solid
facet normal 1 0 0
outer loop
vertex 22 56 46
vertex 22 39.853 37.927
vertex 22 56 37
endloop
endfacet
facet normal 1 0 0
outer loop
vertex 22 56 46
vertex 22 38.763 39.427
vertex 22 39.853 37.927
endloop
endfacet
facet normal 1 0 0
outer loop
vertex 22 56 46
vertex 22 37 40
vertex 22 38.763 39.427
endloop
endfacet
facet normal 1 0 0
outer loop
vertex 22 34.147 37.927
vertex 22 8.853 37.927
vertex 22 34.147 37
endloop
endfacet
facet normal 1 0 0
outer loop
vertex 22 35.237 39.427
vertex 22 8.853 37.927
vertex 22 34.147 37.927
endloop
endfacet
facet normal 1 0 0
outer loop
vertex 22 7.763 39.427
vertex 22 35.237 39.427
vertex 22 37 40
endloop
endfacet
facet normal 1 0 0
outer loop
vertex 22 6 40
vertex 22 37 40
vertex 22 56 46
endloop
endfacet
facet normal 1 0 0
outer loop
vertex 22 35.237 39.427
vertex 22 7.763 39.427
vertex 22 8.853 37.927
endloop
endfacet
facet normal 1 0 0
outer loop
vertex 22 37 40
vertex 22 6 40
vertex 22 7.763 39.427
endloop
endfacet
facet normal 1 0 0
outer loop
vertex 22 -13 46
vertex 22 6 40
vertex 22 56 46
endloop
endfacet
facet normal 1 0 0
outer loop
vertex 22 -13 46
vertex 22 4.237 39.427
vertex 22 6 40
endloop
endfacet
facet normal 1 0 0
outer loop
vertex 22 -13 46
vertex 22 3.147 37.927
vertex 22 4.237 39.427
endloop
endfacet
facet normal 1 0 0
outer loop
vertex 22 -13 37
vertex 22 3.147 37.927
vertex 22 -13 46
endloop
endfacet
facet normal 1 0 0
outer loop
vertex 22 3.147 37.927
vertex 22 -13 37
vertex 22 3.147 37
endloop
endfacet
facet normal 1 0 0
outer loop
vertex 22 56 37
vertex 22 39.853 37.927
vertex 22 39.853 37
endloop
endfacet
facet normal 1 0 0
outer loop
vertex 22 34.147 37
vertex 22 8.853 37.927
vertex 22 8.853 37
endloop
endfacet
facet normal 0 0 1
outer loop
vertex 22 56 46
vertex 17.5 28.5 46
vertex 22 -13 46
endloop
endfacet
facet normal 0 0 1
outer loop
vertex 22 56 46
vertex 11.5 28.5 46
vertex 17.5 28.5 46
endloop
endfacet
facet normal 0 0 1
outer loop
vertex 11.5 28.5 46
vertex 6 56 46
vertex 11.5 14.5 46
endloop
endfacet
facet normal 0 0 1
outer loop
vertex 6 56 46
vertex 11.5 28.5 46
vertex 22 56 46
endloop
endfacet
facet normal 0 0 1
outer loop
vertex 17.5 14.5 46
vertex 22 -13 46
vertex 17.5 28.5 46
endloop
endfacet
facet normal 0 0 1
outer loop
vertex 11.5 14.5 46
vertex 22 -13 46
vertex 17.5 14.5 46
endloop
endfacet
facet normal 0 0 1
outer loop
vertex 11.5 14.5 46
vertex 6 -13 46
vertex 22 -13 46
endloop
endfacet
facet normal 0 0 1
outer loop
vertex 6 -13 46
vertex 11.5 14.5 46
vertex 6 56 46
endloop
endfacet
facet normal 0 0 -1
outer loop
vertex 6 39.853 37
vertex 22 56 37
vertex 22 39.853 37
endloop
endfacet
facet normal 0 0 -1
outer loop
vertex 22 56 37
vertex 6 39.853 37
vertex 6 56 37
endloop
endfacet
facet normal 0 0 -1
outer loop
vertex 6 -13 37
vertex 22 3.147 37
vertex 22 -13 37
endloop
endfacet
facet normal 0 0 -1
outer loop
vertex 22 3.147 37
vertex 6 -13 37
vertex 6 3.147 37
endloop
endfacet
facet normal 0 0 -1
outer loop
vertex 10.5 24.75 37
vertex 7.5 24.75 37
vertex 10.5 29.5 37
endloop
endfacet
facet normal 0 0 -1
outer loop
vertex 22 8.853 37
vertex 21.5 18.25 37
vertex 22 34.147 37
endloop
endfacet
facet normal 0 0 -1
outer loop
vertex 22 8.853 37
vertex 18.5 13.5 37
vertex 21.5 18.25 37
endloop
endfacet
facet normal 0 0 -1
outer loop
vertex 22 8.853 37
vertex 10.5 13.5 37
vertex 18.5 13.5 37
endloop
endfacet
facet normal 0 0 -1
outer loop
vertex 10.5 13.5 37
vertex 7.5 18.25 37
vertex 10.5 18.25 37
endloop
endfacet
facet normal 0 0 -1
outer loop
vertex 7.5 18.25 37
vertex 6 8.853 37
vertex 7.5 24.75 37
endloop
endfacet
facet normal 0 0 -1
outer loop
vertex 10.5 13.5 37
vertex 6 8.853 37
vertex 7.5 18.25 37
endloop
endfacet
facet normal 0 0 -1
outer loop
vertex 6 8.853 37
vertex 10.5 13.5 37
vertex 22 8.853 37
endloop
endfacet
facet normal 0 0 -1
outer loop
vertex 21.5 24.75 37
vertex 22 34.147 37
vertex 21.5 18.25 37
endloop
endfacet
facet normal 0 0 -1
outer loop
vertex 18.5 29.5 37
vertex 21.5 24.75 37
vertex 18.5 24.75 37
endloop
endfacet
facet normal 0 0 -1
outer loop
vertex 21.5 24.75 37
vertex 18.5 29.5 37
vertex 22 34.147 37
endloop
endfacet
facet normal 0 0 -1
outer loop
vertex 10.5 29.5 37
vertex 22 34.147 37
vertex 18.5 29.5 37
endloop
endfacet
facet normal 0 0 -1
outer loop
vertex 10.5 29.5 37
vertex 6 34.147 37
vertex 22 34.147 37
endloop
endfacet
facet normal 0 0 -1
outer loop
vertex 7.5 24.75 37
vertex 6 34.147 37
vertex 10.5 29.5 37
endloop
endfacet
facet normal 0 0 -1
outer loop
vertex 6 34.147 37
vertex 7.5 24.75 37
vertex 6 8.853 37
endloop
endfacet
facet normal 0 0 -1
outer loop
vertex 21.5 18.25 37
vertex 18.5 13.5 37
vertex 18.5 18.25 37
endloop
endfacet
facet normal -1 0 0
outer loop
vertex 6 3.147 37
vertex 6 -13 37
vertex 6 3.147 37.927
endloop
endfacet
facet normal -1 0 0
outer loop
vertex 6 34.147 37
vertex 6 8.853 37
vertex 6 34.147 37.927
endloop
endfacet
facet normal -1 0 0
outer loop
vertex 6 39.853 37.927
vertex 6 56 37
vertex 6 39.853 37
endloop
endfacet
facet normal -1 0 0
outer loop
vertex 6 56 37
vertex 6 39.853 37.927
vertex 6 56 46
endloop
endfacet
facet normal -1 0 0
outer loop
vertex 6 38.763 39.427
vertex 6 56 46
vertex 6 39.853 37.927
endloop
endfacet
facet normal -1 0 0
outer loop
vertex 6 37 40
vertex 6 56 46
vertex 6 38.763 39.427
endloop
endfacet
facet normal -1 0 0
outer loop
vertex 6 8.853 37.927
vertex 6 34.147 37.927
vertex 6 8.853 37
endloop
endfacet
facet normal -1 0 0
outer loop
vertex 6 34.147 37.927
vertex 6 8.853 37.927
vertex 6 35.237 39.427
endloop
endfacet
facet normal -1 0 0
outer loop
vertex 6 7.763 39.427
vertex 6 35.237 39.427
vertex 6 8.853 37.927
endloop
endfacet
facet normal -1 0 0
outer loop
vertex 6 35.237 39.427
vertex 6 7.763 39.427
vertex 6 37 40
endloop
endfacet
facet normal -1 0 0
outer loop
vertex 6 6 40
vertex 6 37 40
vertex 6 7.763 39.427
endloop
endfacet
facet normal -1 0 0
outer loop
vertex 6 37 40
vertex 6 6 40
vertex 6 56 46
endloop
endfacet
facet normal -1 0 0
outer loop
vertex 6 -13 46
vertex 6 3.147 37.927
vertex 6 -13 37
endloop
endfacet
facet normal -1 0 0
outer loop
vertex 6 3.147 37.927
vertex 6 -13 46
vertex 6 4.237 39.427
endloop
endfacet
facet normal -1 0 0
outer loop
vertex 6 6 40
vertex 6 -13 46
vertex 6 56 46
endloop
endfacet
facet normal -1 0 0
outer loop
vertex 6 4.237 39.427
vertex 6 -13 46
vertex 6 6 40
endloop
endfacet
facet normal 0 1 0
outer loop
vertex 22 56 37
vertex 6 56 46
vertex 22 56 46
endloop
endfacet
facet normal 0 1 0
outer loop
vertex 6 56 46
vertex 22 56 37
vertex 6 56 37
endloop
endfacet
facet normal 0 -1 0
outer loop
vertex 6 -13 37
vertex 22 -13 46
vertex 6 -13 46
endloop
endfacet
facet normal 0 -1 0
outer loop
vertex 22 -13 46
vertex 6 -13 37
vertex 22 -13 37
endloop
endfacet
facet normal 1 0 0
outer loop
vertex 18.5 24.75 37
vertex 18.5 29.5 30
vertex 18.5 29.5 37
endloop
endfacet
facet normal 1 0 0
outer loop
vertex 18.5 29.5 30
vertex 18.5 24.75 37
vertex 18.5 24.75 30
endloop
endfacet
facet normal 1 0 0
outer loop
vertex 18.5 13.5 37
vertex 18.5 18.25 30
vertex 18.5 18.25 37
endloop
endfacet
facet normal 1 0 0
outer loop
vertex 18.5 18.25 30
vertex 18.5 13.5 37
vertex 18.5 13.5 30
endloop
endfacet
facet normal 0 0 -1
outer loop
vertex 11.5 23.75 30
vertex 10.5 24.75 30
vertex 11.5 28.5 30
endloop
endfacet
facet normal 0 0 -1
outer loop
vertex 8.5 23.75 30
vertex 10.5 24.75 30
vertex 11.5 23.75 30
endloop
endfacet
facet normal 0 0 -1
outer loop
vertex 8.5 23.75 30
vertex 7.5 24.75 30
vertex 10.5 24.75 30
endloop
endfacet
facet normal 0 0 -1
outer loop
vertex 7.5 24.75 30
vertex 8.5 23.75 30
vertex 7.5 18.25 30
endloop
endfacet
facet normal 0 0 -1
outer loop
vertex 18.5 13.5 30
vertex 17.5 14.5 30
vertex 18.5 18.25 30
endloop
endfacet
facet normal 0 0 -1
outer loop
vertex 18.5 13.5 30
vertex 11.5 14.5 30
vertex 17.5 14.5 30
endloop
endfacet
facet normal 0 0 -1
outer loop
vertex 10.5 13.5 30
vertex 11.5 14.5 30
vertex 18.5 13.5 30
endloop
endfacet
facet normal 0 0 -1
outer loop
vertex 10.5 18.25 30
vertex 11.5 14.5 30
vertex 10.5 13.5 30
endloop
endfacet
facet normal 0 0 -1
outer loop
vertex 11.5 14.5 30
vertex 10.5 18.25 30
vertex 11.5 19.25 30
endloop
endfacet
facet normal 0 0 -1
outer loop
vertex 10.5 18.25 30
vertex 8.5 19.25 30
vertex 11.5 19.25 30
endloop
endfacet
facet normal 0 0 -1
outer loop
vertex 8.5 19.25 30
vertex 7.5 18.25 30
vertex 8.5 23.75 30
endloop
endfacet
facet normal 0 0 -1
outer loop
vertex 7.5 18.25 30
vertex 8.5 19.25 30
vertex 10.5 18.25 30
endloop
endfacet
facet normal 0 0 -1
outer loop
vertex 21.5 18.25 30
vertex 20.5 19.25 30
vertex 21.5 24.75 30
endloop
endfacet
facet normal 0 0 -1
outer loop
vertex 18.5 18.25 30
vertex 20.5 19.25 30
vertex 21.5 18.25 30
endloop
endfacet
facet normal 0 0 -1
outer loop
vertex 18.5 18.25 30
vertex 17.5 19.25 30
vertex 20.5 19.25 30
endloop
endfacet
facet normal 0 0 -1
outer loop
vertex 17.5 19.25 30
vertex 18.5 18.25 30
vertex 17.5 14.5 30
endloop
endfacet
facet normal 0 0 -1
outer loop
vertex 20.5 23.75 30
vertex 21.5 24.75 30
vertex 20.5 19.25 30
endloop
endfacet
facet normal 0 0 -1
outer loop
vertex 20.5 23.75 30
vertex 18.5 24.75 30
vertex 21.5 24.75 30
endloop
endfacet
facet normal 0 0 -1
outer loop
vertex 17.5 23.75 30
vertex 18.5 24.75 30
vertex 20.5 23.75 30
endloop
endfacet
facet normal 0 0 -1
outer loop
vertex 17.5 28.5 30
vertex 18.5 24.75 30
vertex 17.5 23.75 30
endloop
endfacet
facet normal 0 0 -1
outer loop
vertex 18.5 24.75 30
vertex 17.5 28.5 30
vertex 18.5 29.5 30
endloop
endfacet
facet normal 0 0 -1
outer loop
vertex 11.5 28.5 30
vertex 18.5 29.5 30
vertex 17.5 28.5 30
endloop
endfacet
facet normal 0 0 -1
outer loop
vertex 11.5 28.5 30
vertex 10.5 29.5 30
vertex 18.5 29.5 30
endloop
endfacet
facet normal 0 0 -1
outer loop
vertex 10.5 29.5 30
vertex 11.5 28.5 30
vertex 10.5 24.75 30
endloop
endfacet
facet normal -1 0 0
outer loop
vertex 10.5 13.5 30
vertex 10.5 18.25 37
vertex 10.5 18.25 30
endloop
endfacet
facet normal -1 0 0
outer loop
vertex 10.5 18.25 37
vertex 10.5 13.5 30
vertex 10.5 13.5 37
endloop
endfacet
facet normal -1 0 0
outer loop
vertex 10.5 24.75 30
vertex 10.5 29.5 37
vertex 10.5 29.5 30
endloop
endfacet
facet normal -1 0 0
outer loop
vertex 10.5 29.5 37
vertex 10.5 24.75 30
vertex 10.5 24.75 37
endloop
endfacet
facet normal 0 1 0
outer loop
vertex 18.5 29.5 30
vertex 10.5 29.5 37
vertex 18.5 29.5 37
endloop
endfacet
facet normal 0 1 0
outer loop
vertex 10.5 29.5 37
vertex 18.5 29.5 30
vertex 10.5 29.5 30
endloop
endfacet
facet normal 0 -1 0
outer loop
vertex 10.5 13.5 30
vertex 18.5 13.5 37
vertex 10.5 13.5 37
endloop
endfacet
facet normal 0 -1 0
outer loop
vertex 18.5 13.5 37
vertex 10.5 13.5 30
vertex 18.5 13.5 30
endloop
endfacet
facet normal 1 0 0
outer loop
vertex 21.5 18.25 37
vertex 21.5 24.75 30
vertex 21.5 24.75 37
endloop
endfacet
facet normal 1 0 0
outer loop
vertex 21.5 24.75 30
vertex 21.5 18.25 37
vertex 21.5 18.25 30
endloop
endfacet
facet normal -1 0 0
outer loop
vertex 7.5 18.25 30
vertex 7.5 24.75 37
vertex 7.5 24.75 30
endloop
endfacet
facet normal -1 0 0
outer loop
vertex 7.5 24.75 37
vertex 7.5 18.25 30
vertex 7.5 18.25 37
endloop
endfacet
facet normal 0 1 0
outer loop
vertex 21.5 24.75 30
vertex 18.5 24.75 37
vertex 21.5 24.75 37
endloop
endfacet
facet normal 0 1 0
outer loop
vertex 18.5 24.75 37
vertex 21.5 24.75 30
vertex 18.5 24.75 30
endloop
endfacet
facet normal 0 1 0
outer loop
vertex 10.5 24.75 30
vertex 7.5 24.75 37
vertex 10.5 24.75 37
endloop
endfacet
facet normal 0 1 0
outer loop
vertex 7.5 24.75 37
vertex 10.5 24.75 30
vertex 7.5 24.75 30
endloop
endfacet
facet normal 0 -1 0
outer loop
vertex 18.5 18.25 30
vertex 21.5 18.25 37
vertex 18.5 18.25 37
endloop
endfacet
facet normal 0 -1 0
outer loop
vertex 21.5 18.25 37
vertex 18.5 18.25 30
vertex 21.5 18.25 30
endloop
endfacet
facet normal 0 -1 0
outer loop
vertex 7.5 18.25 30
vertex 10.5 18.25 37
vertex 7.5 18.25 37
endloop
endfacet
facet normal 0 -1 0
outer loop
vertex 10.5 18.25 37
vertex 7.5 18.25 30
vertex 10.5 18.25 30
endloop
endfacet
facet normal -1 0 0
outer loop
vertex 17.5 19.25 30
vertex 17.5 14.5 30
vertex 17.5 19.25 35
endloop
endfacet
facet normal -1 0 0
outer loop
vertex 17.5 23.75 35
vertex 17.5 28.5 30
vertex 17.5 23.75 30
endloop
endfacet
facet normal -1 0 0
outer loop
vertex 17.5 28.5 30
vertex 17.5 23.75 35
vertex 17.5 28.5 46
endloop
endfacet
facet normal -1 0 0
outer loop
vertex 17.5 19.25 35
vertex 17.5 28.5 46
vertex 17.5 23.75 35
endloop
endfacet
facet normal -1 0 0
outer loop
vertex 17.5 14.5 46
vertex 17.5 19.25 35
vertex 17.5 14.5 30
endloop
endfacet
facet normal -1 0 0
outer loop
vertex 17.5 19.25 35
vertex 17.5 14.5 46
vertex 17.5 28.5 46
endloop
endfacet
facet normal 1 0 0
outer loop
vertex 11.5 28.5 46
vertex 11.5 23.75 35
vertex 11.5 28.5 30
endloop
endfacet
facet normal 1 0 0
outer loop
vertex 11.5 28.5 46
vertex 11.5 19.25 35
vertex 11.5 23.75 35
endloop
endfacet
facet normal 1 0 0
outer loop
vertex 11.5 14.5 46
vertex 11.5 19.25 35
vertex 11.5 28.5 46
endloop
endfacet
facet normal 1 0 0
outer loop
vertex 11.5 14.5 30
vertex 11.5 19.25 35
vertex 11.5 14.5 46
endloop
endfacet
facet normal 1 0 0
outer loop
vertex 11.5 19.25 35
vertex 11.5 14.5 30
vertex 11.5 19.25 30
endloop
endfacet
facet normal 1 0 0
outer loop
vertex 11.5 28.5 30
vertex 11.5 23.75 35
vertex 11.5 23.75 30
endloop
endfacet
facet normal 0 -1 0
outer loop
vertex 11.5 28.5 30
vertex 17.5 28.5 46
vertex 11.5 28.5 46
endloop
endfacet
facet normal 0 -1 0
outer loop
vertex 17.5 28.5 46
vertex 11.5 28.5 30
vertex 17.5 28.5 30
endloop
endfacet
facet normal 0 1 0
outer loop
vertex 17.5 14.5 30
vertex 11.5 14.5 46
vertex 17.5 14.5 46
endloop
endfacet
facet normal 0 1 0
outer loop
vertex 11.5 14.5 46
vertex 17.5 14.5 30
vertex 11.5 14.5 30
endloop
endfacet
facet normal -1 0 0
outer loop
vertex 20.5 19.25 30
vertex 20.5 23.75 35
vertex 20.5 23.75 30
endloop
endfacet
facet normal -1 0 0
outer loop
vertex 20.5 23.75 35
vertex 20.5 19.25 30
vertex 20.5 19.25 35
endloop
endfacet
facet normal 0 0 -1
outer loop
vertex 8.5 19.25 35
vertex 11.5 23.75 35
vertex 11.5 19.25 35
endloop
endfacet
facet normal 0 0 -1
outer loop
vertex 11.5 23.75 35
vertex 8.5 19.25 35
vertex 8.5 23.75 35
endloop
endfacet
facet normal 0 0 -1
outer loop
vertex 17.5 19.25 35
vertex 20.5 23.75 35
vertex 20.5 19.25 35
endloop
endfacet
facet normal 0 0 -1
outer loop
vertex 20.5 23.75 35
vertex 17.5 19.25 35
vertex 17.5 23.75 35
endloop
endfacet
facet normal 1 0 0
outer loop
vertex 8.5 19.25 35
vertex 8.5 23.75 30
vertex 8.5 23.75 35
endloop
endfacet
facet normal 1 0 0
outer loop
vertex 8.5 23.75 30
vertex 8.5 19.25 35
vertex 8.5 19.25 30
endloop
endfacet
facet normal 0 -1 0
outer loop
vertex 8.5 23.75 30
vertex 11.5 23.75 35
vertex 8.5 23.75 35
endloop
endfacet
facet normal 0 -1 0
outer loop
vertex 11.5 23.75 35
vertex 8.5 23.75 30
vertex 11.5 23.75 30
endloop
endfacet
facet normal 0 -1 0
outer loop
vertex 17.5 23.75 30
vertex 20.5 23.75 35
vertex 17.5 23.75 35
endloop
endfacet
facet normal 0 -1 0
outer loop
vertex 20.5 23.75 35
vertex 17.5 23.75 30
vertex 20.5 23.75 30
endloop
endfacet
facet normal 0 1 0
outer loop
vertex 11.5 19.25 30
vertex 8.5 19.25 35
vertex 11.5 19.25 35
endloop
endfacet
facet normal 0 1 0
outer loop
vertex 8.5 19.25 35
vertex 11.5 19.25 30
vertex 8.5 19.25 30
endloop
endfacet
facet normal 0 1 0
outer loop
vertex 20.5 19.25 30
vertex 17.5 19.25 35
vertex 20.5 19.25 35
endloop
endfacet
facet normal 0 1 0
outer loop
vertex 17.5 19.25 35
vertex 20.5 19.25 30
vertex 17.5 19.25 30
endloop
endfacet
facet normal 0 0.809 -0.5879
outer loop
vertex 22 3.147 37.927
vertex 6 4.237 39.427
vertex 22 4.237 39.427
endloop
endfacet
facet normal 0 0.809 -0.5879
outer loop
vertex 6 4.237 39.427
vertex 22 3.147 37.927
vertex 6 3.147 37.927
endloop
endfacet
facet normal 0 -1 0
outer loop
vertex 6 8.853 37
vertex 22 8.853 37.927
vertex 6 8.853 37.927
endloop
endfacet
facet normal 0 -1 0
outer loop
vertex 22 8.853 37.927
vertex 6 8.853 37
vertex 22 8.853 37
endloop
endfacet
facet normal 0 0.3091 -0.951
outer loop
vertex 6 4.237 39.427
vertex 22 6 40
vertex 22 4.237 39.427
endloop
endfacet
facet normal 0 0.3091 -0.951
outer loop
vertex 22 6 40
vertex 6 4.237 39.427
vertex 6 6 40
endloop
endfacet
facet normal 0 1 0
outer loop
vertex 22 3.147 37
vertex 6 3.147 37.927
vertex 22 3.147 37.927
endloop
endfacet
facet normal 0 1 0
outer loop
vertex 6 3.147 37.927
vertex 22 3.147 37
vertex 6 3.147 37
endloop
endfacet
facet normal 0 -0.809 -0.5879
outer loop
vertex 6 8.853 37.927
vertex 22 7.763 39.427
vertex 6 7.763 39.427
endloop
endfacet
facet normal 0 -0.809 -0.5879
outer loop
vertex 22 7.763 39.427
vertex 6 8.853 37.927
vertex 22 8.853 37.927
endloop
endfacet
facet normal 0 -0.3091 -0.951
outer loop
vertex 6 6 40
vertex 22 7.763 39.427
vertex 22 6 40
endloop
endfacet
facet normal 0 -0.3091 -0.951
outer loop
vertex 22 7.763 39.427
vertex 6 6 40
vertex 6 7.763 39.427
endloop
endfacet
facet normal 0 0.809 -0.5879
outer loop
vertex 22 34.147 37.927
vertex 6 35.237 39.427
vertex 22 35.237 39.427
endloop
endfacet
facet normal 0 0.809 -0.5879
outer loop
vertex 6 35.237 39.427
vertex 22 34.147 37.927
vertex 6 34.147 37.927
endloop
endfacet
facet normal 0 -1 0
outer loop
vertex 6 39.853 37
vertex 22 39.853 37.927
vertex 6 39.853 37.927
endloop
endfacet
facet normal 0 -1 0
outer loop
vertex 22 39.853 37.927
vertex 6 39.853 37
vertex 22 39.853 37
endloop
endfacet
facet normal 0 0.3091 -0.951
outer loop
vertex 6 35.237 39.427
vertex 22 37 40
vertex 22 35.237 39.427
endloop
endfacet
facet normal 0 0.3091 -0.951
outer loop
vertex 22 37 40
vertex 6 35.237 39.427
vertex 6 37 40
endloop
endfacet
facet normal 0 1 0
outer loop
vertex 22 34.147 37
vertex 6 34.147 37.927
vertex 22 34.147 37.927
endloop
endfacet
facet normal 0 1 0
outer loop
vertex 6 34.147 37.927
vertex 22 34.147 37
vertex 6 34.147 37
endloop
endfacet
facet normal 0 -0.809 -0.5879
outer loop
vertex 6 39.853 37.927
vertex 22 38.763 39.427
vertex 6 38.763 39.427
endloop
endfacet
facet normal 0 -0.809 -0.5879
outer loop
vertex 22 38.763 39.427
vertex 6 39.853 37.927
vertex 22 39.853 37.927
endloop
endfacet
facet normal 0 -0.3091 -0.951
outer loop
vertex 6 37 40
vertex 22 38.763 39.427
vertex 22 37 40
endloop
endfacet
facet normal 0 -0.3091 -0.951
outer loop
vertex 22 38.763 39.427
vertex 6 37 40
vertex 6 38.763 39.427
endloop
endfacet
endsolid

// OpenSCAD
//translate([100,0,0]) import("./bowden_trubicky.stl");
tolerance=2;
polomer_bow=3.5;
/*
difference() {
	union() {
		translate([0,-3,0]) cube([5,43+6,43]);

		translate([0,-13,19.2]) cube([24,25,15]);
		translate([24,-3.5,19.2]) cube([10,3.5,15]);

		translate([0,41-6,19.2]) cube([24,21,15]);
		translate([24,42.65,19.2]) cube([10,3.5,15]);
        
		translate([0,41-6,10]) cube([24,11,15]);
		translate([0,-3,10]) cube([24,15,15]);

		translate([24,51,19.2]) cube([10,5,15]);
	}

//lozisko
	translate([-10,21.5,21.5]) rotate([0,90,0]) cylinder(r=8.2,h=50);

// fliament
	translate([14,-55,21.5+5.2]) rotate([-90,0,0]) cylinder(r=3,h=220,$fn=32);

translate([14,20,21.5+5.2-tolerance]) rotate([-90,0,0]) cylinder(r=polomer_bow,h=100, $fn=16);
translate([14,20,21.5+5.2+tolerance]) rotate([-90,0,0]) cylinder(r=polomer_bow,h=100, $fn=16);
translate([14-polomer_bow,20,21.5+5.2-tolerance]) cube([polomer_bow*2,100,tolerance*2]);


// srouby
	translate([0.5,21.5-15.5,21.5-15.5]) rotate([0,90,0]) cylinder(r=1.6,h=20);
	translate([0.5,21.5+15.5,21.5-15.5]) rotate([0,90,0]) cylinder(r=1.6,h=20);
	translate([0.5,21.5+15.5,21.5+15.5]) rotate([0,90,0]) cylinder(r=1.6,h=20);
	translate([0.5,21.5-15.5,21.5+15.5]) rotate([0,90,0]) cylinder(r=1.6,h=20);



}*/

// IDLER
translate([14.5-7.5,-3,37]) {
	difference() {
		union() {
			translate([-1,-10,0]) cube([16,69,9]);
			translate([4.5-1, 24.5-7-1, -7]) cube([6+2, 14+2, 12]);
			translate([7.5-6-1, 24.5-2.25-1, -7]) cube([12+2, 4.5+2, 8]);
		}
		translate([4.5, 24.5-7, -10]) cube([6, 14, 100]);
		translate([7.5-6, 24.5-2.25, -12]) cube([12, 4.5, 10]);
		translate([-2,9,0]) rotate([0,90,0]) cylinder(r=3,h=44);
		translate([-2,40,0]) rotate([0,90,0]) cylinder(r=3,h=44);
	}
}

// ložisko horní
//translate([9,16.5,26.075]) cube([10,10,10]);


// motor
//translate([24,21.5-21.15, 21.5-21.15]) cube([50,42.3,42.3]);



/*
vyska=20;
// horni kec 
translate([5,0,40]) {
difference() {union(){
	translate([2,-8,0]) cube([17,43+10+6,7.5]);
	//translate([9-7.5-1,20.5-2.5-1,-2]) cube([17,7,2]);

//	translate([0,42,-vyska]) cube([19,5,vyska]);
	}
	

translate([3.5,20.5-2.5,-1]) cube([13,5,6.5]);
translate([9-3,20.5-7.5,-15.5]) cube([6,15,30]);
//translate([9,-1,-1.5-4.5]) rotate([-90,0,0]) cylinder(r=1,h=120, $fn=8);
//translate([9,-1,-1.5-4.5-5]) rotate([-90,0,0]) cylinder(r=1,h=120, $fn=8)
;
//translate([9-1,41,-1.5-4.5-5]) cube([2,10,5]);
}

}
*/
